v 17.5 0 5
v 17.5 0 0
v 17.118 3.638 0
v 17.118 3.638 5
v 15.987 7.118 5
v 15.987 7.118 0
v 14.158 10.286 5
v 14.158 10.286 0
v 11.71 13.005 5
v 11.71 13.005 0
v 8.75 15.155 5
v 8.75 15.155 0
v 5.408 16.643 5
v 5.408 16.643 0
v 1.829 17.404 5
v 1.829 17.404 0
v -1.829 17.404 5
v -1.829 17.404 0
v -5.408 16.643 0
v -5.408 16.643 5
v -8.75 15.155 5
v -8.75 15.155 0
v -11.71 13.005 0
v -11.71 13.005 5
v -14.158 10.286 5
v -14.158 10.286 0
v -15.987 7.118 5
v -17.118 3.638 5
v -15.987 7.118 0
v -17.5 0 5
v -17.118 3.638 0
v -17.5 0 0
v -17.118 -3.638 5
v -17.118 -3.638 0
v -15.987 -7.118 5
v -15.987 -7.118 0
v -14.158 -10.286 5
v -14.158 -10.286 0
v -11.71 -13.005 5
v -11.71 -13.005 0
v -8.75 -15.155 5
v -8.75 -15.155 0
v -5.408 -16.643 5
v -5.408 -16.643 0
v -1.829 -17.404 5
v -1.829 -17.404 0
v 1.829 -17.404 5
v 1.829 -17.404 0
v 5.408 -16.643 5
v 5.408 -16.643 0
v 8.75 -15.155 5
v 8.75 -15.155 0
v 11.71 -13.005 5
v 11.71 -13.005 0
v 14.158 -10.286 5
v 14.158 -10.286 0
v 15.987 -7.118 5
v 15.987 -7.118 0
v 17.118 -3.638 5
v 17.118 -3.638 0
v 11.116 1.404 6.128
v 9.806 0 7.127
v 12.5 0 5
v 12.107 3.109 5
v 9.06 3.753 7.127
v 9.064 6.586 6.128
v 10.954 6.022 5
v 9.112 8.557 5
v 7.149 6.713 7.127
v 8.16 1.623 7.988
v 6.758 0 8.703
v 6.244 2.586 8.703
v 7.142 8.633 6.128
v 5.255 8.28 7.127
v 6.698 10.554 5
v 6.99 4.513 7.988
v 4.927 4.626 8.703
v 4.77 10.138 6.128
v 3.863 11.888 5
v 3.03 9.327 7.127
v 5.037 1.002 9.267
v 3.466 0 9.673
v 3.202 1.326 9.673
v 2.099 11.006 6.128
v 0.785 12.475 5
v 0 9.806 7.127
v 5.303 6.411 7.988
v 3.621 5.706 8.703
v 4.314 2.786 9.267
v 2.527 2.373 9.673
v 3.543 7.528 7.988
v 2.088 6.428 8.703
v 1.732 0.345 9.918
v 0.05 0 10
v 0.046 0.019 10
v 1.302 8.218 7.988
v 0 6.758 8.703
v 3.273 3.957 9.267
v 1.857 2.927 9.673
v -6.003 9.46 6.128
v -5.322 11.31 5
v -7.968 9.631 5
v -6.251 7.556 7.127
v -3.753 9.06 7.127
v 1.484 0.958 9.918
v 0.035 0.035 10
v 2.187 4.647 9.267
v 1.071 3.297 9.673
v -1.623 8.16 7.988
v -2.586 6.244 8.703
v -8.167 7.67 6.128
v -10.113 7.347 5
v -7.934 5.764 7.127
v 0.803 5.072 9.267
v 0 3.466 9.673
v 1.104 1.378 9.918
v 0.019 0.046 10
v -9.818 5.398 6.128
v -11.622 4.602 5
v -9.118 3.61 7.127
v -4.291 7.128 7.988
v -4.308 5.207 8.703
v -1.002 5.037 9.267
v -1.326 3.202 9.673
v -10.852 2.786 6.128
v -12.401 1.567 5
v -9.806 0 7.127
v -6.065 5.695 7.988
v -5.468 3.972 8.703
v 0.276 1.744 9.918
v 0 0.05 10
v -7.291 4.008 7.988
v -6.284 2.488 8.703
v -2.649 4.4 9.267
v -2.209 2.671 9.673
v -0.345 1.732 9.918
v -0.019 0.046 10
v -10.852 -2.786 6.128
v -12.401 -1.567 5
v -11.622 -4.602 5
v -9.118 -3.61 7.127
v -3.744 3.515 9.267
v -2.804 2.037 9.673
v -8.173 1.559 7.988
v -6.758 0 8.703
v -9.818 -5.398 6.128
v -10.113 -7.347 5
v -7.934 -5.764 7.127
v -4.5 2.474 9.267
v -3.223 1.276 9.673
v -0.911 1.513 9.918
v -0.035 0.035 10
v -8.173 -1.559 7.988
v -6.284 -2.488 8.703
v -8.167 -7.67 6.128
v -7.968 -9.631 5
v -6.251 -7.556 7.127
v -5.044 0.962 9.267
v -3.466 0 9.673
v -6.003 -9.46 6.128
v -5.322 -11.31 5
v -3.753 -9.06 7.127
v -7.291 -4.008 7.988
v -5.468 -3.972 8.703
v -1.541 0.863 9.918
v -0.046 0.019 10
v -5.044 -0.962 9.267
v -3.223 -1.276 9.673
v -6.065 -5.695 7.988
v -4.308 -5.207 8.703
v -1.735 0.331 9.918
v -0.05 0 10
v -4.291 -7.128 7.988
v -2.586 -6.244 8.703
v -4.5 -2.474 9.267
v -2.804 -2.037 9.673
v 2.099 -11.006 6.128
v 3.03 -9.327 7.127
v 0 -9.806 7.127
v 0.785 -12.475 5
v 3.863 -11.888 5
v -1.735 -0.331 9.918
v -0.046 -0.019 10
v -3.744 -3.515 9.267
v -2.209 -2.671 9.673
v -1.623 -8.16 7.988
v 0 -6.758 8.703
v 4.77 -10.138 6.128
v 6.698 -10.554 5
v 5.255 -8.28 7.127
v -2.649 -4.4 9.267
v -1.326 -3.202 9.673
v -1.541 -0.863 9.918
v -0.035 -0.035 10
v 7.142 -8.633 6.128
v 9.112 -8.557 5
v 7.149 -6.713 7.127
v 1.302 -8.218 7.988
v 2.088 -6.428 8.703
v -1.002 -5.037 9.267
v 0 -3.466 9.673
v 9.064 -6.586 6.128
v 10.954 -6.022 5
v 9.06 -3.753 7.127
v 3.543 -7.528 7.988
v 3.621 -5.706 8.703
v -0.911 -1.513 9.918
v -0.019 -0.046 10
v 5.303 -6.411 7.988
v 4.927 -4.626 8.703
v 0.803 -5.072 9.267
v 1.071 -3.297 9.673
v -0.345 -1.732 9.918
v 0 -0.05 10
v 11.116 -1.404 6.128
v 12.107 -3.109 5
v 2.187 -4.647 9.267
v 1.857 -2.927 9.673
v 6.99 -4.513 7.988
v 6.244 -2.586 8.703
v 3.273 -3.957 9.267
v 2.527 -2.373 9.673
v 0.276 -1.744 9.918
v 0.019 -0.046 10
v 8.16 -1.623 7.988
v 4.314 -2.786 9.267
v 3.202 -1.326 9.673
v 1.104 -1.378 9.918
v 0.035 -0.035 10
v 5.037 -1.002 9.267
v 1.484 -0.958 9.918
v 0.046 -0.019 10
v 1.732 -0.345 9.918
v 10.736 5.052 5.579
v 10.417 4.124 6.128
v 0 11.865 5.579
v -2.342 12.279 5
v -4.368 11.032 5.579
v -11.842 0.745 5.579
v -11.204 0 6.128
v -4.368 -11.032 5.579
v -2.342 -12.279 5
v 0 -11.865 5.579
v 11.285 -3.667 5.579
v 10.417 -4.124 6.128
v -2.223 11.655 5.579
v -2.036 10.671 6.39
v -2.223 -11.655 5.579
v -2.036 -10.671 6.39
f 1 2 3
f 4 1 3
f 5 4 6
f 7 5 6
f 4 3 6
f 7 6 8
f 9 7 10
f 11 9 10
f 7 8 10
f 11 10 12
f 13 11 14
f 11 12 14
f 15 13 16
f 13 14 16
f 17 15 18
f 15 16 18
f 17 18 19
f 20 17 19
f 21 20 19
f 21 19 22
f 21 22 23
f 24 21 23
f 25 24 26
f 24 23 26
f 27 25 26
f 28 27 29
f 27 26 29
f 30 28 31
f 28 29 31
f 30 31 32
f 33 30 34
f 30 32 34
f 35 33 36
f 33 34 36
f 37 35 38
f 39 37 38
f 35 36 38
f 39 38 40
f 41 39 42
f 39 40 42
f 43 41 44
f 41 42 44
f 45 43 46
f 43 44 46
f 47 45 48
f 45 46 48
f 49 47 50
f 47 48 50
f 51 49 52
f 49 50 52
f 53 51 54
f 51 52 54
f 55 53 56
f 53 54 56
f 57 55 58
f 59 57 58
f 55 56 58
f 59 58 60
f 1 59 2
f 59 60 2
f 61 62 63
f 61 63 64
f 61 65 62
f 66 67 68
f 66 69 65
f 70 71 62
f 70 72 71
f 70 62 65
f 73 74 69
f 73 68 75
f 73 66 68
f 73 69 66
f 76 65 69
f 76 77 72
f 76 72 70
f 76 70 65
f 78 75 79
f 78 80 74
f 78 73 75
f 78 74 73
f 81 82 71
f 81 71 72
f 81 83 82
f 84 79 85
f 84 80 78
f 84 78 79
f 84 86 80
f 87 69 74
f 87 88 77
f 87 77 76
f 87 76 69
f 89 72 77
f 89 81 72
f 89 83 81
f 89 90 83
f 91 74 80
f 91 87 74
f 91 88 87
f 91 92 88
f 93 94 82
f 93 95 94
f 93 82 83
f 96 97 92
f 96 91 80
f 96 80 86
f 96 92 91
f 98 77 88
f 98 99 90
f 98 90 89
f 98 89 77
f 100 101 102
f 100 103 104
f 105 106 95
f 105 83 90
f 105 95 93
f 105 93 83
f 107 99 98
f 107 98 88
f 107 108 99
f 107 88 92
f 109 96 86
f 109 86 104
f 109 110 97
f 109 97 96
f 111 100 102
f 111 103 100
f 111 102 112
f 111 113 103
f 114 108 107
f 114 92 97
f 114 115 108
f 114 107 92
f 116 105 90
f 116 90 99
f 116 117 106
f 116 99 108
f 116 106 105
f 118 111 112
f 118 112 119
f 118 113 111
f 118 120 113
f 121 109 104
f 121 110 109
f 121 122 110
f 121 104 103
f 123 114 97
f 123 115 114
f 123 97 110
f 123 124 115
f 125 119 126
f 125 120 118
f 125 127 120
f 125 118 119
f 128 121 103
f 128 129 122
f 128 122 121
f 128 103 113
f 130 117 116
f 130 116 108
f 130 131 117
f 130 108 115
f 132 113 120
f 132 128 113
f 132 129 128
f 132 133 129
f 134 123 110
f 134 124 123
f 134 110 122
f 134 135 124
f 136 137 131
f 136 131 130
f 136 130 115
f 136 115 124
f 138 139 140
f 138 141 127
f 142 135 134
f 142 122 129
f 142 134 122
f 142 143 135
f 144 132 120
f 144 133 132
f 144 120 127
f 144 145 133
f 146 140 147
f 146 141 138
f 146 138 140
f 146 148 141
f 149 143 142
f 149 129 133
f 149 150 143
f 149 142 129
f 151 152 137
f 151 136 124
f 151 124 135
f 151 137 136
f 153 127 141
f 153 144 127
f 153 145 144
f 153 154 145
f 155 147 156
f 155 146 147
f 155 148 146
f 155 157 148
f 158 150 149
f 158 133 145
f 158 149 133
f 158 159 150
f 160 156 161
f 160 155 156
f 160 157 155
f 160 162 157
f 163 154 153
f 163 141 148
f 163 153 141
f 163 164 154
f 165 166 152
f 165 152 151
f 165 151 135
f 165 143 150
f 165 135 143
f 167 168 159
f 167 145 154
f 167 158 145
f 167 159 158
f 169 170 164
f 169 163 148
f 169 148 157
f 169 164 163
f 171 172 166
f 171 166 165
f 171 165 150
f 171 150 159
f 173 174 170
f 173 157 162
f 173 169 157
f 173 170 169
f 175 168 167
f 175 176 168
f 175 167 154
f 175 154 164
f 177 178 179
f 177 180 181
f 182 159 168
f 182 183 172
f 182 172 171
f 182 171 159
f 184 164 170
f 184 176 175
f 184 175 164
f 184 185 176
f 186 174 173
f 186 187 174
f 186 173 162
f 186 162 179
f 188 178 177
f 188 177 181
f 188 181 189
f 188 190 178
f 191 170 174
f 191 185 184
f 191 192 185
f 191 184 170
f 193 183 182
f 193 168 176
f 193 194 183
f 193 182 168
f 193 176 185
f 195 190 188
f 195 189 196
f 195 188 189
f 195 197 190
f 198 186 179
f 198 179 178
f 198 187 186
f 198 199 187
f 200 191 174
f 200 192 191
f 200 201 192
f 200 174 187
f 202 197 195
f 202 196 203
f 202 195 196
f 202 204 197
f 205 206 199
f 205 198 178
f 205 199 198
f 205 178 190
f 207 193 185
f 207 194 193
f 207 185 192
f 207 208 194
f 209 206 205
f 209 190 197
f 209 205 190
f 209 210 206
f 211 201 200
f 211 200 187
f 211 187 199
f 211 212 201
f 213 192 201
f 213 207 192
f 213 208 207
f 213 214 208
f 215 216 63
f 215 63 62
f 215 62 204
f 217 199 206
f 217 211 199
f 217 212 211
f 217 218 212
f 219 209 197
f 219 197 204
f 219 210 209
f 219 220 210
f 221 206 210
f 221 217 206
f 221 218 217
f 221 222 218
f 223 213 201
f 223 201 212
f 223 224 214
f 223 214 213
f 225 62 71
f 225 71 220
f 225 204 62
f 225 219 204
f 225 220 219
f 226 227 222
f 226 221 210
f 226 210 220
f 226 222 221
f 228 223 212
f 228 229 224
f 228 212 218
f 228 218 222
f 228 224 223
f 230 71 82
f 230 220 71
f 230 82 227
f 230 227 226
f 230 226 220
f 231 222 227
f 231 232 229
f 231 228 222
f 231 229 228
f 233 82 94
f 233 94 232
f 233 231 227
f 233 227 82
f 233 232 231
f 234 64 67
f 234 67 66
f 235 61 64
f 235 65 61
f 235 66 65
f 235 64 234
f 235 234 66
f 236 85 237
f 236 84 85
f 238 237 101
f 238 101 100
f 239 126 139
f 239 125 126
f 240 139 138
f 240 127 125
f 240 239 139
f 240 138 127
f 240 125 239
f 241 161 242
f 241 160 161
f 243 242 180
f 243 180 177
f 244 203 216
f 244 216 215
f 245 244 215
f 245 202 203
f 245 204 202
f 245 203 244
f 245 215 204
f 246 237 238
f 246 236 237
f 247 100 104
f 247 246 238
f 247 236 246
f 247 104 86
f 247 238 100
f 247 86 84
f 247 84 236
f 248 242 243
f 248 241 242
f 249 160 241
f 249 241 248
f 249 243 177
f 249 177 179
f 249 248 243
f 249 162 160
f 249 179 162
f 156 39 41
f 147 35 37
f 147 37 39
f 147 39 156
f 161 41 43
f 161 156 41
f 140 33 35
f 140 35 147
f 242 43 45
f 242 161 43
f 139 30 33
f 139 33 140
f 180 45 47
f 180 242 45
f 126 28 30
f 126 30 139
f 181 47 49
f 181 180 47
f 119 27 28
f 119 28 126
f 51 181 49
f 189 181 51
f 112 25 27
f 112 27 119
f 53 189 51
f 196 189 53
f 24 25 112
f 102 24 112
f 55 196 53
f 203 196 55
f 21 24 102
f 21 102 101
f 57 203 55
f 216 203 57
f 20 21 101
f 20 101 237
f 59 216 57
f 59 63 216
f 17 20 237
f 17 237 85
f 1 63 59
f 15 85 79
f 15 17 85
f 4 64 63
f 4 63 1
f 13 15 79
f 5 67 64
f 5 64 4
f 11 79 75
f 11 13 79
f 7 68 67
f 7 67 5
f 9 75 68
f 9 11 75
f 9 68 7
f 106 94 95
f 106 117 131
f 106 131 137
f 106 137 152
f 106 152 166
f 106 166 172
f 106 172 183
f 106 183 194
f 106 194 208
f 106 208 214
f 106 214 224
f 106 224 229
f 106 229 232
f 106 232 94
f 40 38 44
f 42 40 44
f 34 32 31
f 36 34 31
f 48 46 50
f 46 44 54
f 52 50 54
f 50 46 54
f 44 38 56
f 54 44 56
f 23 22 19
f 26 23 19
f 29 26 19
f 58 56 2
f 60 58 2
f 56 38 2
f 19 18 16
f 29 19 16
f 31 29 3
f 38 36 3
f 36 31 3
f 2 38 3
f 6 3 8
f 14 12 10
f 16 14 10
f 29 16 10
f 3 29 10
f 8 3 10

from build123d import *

# Parameters (mm, degrees)
F0_R     = 17.5
F1_DEPTH = 5
F2_R     = 12.5
F3_DEPTH = 5


# Not quite as in the source:
# - a fillet or chamfer that OpenCascade refuses, or shapes differently, is made with other operations: its cross-section is extruded or revolved along the edge and cut away or added


with BuildPart() as f1:
    # F0 (on Top) → F1 (new body)
    with BuildSketch(Plane.XY):
        Circle(F0_R)
    extrude(amount=F1_DEPTH)

    # F2 (on face) → F3 (join)
    with BuildSketch(Plane.XY.offset(5)):
        Circle(F2_R)
    extrude(amount=F3_DEPTH)

    # F4: fillet of radius 18 on 1 edges, made by hand

    # F4_s1 → F4_t2 (revolve, cut)
    with BuildSketch(Plane.XZ):
        with BuildLine():
            ThreePointArc((12.5, 5), (6.7583043345, 8.7032930885), (0.050100402, 10))
            Line((0.050100402, 10), (0.050100402, 10.36))
            Line((0.050100402, 10.36), (12.5, 10.36))
            Line((12.5, 10.36), (12.86, 10))
            ThreePointArc((12.86, 10), (12.86, 7.5), (12.748997992, 5.26))
            Line((12.748997992, 5.26), (12.5, 5))
        make_face()
    revolve(axis=Axis((0, 0, 10), (0, 0, 1)), mode=Mode.SUBTRACT)


solid = f1.part
